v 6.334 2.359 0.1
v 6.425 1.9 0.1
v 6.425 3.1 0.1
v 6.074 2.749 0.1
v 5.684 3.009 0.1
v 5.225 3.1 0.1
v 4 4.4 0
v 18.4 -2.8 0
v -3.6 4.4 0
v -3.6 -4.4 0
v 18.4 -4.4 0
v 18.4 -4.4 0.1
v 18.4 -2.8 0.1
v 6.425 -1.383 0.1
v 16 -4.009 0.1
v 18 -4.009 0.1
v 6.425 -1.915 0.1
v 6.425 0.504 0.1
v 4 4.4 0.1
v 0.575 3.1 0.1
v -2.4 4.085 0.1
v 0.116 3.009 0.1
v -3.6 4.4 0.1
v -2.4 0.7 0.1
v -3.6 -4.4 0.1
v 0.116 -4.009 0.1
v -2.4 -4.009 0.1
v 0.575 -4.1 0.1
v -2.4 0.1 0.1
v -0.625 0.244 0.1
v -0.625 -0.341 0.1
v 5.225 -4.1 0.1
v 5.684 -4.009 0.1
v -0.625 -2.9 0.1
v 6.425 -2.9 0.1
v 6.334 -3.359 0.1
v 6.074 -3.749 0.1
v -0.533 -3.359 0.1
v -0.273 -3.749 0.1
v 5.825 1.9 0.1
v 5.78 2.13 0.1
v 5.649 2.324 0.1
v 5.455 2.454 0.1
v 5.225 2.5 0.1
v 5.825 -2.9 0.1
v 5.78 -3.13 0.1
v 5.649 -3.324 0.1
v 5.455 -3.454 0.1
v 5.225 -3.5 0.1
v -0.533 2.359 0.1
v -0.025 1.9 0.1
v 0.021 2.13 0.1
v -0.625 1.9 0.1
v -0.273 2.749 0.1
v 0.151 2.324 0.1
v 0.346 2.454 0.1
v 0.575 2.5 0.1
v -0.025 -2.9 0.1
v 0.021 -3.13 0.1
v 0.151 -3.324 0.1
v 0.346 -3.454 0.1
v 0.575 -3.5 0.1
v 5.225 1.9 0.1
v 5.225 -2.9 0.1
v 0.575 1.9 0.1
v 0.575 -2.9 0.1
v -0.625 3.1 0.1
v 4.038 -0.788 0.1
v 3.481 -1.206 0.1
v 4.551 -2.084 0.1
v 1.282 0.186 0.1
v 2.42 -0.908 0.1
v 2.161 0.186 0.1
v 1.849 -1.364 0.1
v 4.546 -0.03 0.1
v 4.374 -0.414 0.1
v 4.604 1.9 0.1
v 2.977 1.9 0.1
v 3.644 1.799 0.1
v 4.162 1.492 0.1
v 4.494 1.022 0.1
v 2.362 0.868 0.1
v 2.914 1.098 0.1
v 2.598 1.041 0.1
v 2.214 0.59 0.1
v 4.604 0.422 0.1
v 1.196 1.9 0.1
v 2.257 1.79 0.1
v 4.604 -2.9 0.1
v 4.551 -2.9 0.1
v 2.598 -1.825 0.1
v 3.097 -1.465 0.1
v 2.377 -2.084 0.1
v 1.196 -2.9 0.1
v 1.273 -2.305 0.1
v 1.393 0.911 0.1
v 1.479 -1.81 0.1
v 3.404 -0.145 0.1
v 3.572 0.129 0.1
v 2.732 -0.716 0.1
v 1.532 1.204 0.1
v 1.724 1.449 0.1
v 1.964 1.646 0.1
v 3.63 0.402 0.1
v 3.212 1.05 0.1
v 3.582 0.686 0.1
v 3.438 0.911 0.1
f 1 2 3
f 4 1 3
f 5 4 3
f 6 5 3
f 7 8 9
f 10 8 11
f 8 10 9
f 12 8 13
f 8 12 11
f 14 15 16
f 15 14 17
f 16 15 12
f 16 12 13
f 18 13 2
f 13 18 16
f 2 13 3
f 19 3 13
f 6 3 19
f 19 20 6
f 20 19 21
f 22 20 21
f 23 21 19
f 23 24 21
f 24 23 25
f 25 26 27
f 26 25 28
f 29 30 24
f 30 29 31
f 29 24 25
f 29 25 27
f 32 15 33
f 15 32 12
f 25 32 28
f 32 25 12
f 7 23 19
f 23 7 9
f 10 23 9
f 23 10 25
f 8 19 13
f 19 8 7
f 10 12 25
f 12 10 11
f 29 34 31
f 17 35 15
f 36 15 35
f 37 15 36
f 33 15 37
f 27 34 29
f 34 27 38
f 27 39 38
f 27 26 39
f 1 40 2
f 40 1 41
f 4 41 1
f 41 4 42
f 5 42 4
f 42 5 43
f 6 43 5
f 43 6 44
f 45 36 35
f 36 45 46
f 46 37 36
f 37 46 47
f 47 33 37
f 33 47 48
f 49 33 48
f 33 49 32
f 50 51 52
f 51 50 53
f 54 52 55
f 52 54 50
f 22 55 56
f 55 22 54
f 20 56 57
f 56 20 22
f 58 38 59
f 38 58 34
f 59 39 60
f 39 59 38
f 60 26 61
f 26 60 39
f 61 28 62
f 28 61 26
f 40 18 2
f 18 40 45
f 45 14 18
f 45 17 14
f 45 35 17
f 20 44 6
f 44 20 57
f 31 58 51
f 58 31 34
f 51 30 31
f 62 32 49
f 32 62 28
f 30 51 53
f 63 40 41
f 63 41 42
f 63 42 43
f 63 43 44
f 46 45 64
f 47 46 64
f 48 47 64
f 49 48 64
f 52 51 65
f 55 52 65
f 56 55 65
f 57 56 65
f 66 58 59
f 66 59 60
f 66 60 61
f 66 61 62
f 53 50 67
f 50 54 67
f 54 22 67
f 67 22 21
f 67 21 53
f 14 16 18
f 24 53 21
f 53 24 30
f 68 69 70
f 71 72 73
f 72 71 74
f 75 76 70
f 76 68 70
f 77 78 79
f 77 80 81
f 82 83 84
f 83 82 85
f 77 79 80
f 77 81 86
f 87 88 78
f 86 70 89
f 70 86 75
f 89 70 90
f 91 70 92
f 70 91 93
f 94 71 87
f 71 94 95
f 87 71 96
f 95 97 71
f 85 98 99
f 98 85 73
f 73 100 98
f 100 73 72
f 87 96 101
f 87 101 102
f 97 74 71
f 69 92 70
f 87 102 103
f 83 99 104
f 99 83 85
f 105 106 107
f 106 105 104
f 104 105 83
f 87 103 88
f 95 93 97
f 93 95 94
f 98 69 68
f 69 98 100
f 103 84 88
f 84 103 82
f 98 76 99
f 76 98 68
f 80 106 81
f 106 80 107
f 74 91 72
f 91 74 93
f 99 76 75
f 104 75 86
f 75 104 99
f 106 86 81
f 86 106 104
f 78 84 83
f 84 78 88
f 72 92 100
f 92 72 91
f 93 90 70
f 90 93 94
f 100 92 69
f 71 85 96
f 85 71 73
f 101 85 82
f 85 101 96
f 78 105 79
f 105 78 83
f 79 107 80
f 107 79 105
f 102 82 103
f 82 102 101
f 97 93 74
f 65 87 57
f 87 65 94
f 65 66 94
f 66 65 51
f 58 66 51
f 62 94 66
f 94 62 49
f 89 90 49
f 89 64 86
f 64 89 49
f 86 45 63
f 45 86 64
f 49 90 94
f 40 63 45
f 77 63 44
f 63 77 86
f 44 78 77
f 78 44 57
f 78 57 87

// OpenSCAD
// file: ../p/1-4ndis.scad
use <../lib.scad>
function ldraw_lib__1_4ndis() = [
// 0 Disc Negative 0.25
// 0 Name: 1-4ndis.dat
// 0 Author: James Jessiman
// 0 !LDRAW_ORG Primitive UPDATE 2012-01
// 0 !LICENSE Licensed under CC BY 4.0 : see CAreadme.txt
// 
// 0 BFC CERTIFY CCW
  [0,"BFC","CERTIFY"],
  [0,"BFC","CCW"],
// 
// 0 !HISTORY 2002-03-23 [sbliss] Added BFC Statement
// 0 !HISTORY 2002-04-25 [PTadmin] Official Update 2002-02
// 0 !HISTORY 2007-06-22 [PTadmin] Header formatted for Contributor Agreement
// 0 !HISTORY 2008-07-01 [PTadmin] Official Update 2008-01
// 0 !HISTORY 2012-02-16 [Philo] Changed to CCW
// 0 !HISTORY 2012-03-30 [PTadmin] Official Update 2012-01
// 
// 
// 3 16 0.9239 0 0.3827 1 0 0 1 0 1
  [3,16,0.9239,0,0.3827,1,0,0,1,0,1],
// 3 16 0.7071 0 0.7071 0.9239 0 0.3827 1 0 1
  [3,16,0.7071,0,0.7071,0.9239,0,0.3827,1,0,1],
// 3 16 0.3827 0 0.9239 0.7071 0 0.7071 1 0 1
  [3,16,0.3827,0,0.9239,0.7071,0,0.7071,1,0,1],
// 3 16 0 0 1 0.3827 0 0.9239 1 0 1
  [3,16,0,0,1,0.3827,0,0.9239,1,0,1],
];
module ldraw_lib__1_4ndis(step=0, col=false, unit=2/5, alt=false, line=0.2, solid=!$preview)
    makepoly(ldraw_lib__1_4ndis(), step=step, col=col, unit=unit, alt=alt, line=line, solid=solid);
ldraw_lib__1_4ndis(line=0.2);
// file: ../p/3-16ndis.scad
use <../lib.scad>
function ldraw_lib__3_16ndis() = [
// 0 Disc Negative 0.1875
// 0 Name: 3-16ndis.dat
// 0 Author: Guy Vivan [guyvivan]
// 0 !LDRAW_ORG Primitive UPDATE 2009-01
// 0 !LICENSE Licensed under CC BY 2.0 and CC BY 4.0 : see CAreadme.txt
// 
// 0 BFC CERTIFY CCW
  [0,"BFC","CERTIFY"],
  [0,"BFC","CCW"],
// 
// 0 !HISTORY 2009-05-02 [PTadmin] Official Update 2009-01
// 
// 
// 3 16 1 0 1 0.9239 0 0.3827 1 0 0
  [3,16,1,0,1,0.9239,0,0.3827,1,0,0],
// 3 16 1 0 1 0.7071 0 0.7071 0.9239 0 0.3827
  [3,16,1,0,1,0.7071,0,0.7071,0.9239,0,0.3827],
// 3 16 1 0 1 0.3827 0 0.9239 0.7071 0 0.7071
  [3,16,1,0,1,0.3827,0,0.9239,0.7071,0,0.7071],
// 
// 0 end of file
// 
];
module ldraw_lib__3_16ndis(step=0, col=false, unit=2/5, alt=false, line=0.2, solid=!$preview)
    makepoly(ldraw_lib__3_16ndis(), step=step, col=col, unit=unit, alt=alt, line=line, solid=solid);
ldraw_lib__3_16ndis(line=0.2);
// file: ../p/1-4ring1.scad
use <../lib.scad>
function ldraw_lib__1_4ring1() = [
// 0 Ring  1 x 0.25
// 0 Name: 1-4ring1.dat
// 0 Author: Chris Dee [cwdee]
// 0 !LDRAW_ORG Primitive UPDATE 2012-01
// 0 !LICENSE Licensed under CC BY 2.0 and CC BY 4.0 : see CAreadme.txt
// 
// 0 BFC CERTIFY CCW
  [0,"BFC","CERTIFY"],
  [0,"BFC","CCW"],
// 
// 0 !HISTORY 2000-05-07 [PTadmin] Official Update 2000-01
// 0 !HISTORY 2002-11-22 [hafhead] Added BFC statement
// 0 !HISTORY 2002-11-30 [PTadmin] Official Update 2002-05
// 0 !HISTORY 2007-06-22 [PTadmin] Header formatted for Contributor Agreement
// 0 !HISTORY 2008-07-01 [PTadmin] Official Update 2008-01
// 0 !HISTORY 2012-02-16 [Philo] Changed to CCW
// 0 !HISTORY 2012-03-30 [PTadmin] Official Update 2012-01
// 
// 
// 4 16 2 0 0 1.8478 0 0.7654 0.9239 0 0.3827 1 0 0
  [4,16,2,0,0,1.8478,0,0.7654,0.9239,0,0.3827,1,0,0],
// 4 16 1.8478 0 0.7654 1.4142 0 1.4142 0.7071 0 0.7071 0.9239 0 0.3827
  [4,16,1.8478,0,0.7654,1.4142,0,1.4142,0.7071,0,0.7071,0.9239,0,0.3827],
// 4 16 1.4142 0 1.4142 0.7654 0 1.8478 0.3827 0 0.9239 0.7071 0 0.7071
  [4,16,1.4142,0,1.4142,0.7654,0,1.8478,0.3827,0,0.9239,0.7071,0,0.7071],
// 4 16 0.7654 0 1.8478 0 0 2 0 0 1 0.3827 0 0.9239
  [4,16,0.7654,0,1.8478,0,0,2,0,0,1,0.3827,0,0.9239],
];
module ldraw_lib__1_4ring1(step=0, col=false, unit=2/5, alt=false, line=0.2, solid=!$preview)
    makepoly(ldraw_lib__1_4ring1(), step=step, col=col, unit=unit, alt=alt, line=line, solid=solid);
ldraw_lib__1_4ring1(line=0.2);
// file: ../p/1-4disc.scad
use <../lib.scad>
function ldraw_lib__1_4disc() = [
// 0 Disc 0.25
// 0 Name: 1-4disc.dat
// 0 Author: James Jessiman
// 0 !LDRAW_ORG Primitive UPDATE 2002-02
// 0 !LICENSE Licensed under CC BY 4.0 : see CAreadme.txt
// 
// 0 BFC CERTIFY CCW
  [0,"BFC","CERTIFY"],
  [0,"BFC","CCW"],
// 
// 0 !HISTORY 2002-03-23 [sbliss] Added BFC statement.
// 0 !HISTORY 2002-04-25 [PTadmin] Official Update 2002-02
// 0 !HISTORY 2007-06-22 [PTadmin] Header formatted for Contributor Agreement
// 0 !HISTORY 2008-07-01 [PTadmin] Official Update 2008-01
// 
// 
// 3 16 0 0 0 1 0 0 0.9239 0 0.3827
  [3,16,0,0,0,1,0,0,0.9239,0,0.3827],
// 3 16 0 0 0 0.9239 0 0.3827 0.7071 0 0.7071
  [3,16,0,0,0,0.9239,0,0.3827,0.7071,0,0.7071],
// 3 16 0 0 0 0.7071 0 0.7071 0.3827 0 0.9239
  [3,16,0,0,0,0.7071,0,0.7071,0.3827,0,0.9239],
// 3 16 0 0 0 0.3827 0 0.9239 0 0 1
  [3,16,0,0,0,0.3827,0,0.9239,0,0,1],
// 0
];
module ldraw_lib__1_4disc(step=0, col=false, unit=2/5, alt=false, line=0.2, solid=!$preview)
    makepoly(ldraw_lib__1_4disc(), step=step, col=col, unit=unit, alt=alt, line=line, solid=solid);
ldraw_lib__1_4disc(line=0.2);
// file: ../p/type-swiss721bt-bold-n2.scad
use <../lib.scad>
function ldraw_lib__type_swiss721bt_bold_n2() = [
// 0 Type Swiss721BT Number "2" Bold
// 0 Name: type-swiss721bt-bold-n2.dat
// 0 Author: Ulrich Röder [UR]
// 0 !LDRAW_ORG Primitive UPDATE 2019-01
// 0 !LICENSE Licensed under CC BY 4.0 : see CAreadme.txt
// 
// 0 BFC CERTIFY CCW
  [0,"BFC","CERTIFY"],
  [0,"BFC","CCW"],
// 
// 0 !HISTORY 2019-06-28 [PTadmin] Official Update 2019-01
// 
// 
// 0 // Main
// 3 16 .237 0 -.06 .121 0 -.147 .344 0 -.33
  [3,16,.237,0,-.06,.121,0,-.147,.344,0,-.33],
// 4 16 -.154 0 .143 -.337 0 .143 -.219 0 -.18 -.1 0 -.085
  [4,16,-.154,0,.143,-.337,0,.143,-.219,0,-.18,-.1,0,-.085],
// 3 16 .343 0 .098 .307 0 .018 .344 0 -.33
  [3,16,.343,0,.098,.307,0,.018,.344,0,-.33],
// 3 16 .307 0 .018 .237 0 -.06 .344 0 -.33
  [3,16,.307,0,.018,.237,0,-.06,.344,0,-.33],
// 3 16 .355 0 .5 .016 0 .5 .155 0 .479
  [3,16,.355,0,.5,.016,0,.5,.155,0,.479],
// 3 16 .355 0 .5 .263 0 .415 .332 0 .317
  [3,16,.355,0,.5,.263,0,.415,.332,0,.317],
// 4 16 -.112 0 .285 -.143 0 .227 .003 0 .333 -.063 0 .321
  [4,16,-.112,0,.285,-.143,0,.227,.003,0,.333,-.063,0,.321],
// 3 16 .355 0 .5 .155 0 .479 .263 0 .415
  [3,16,.355,0,.5,.155,0,.479,.263,0,.415],
// 3 16 .355 0 .5 .332 0 .317 .355 0 .192
  [3,16,.355,0,.5,.332,0,.317,.355,0,.192],
// 3 16 -.355 0 .5 -.134 0 .477 .016 0 .5
  [3,16,-.355,0,.5,-.134,0,.477,.016,0,.5],
// 4 16 .355 0 -.5 .355 0 .192 .343 0 .098 .344 0 -.33
  [4,16,.355,0,-.5,.355,0,.192,.343,0,.098,.344,0,-.33],
// 3 16 .355 0 -.5 .344 0 -.33 .344 0 -.5
  [3,16,.355,0,-.5,.344,0,-.33,.344,0,-.5],
// 4 16 -.109 0 -.33 .344 0 -.33 .041 0 -.201 -.063 0 -.276
  [4,16,-.109,0,-.33,.344,0,-.33,.041,0,-.201,-.063,0,-.276],
// 4 16 -.339 0 -.376 -.337 0 .143 -.355 0 .5 -.355 0 -.5
  [4,16,-.339,0,-.376,-.337,0,.143,-.355,0,.5,-.355,0,-.5],
// 3 16 -.355 0 .5 -.337 0 .143 -.314 0 .294
  [3,16,-.355,0,.5,-.337,0,.143,-.314,0,.294],
// 3 16 -.339 0 -.376 -.296 0 -.273 -.337 0 .143
  [3,16,-.339,0,-.376,-.296,0,-.273,-.337,0,.143],
// 4 16 .14 0 .131 -.143 0 .227 -.154 0 .143 .105 0 .074
  [4,16,.14,0,.131,-.143,0,.227,-.154,0,.143,.105,0,.074],
// 4 16 -.1 0 -.085 -.035 0 -.045 .105 0 .074 -.154 0 .143
  [4,16,-.1,0,-.085,-.035,0,-.045,.105,0,.074,-.154,0,.143],
// 3 16 -.355 0 .5 -.314 0 .294 -.285 0 .355
  [3,16,-.355,0,.5,-.314,0,.294,-.285,0,.355],
// 3 16 -.355 0 .5 -.285 0 .355 -.245 0 .406
  [3,16,-.355,0,.5,-.285,0,.355,-.245,0,.406],
// 3 16 -.296 0 -.273 -.219 0 -.18 -.337 0 .143
  [3,16,-.296,0,-.273,-.219,0,-.18,-.337,0,.143],
// 3 16 .121 0 -.147 .041 0 -.201 .344 0 -.33
  [3,16,.121,0,-.147,.041,0,-.201,.344,0,-.33],
// 3 16 -.355 0 .5 -.245 0 .406 -.195 0 .447
  [3,16,-.355,0,.5,-.245,0,.406,-.195,0,.447],
// 4 16 .152 0 .188 .003 0 .333 -.143 0 .227 .14 0 .131
  [4,16,.152,0,.188,.003,0,.333,-.143,0,.227,.14,0,.131],
// 4 16 .112 0 .294 .065 0 .323 .152 0 .188 .142 0 .247
  [4,16,.112,0,.294,.065,0,.323,.152,0,.188,.142,0,.247],
// 3 16 .152 0 .188 .065 0 .323 .003 0 .333
  [3,16,.152,0,.188,.065,0,.323,.003,0,.333],
// 3 16 -.355 0 .5 -.195 0 .447 -.134 0 .477
  [3,16,-.355,0,.5,-.195,0,.447,-.134,0,.477],
// 
// 0 // Black
// 4 0 -.296 0 -.273 -.339 0 -.376 -.355 0 -.5 -.109 0 -.33
  [4,0,-.296,0,-.273,-.339,0,-.376,-.355,0,-.5,-.109,0,-.33],
// 4 0 -.035 0 -.045 .121 0 -.147 .237 0 -.06 .105 0 .074
  [4,0,-.035,0,-.045,.121,0,-.147,.237,0,-.06,.105,0,.074],
// 4 0 -.134 0 .477 -.195 0 .447 -.112 0 .285 -.063 0 .321
  [4,0,-.134,0,.477,-.195,0,.447,-.112,0,.285,-.063,0,.321],
// 4 0 .237 0 -.06 .307 0 .018 .14 0 .131 .105 0 .074
  [4,0,.237,0,-.06,.307,0,.018,.14,0,.131,.105,0,.074],
// 4 0 .112 0 .294 .142 0 .247 .332 0 .317 .263 0 .415
  [4,0,.112,0,.294,.142,0,.247,.332,0,.317,.263,0,.415],
// 4 0 -.1 0 -.085 -.219 0 -.18 -.109 0 -.33 -.063 0 -.276
  [4,0,-.1,0,-.085,-.219,0,-.18,-.109,0,-.33,-.063,0,-.276],
// 3 0 .14 0 .131 .307 0 .018 .343 0 .098
  [3,0,.14,0,.131,.307,0,.018,.343,0,.098],
// 4 0 .14 0 .131 .343 0 .098 .355 0 .192 .152 0 .188
  [4,0,.14,0,.131,.343,0,.098,.355,0,.192,.152,0,.188],
// 4 0 .152 0 .188 .355 0 .192 .332 0 .317 .142 0 .247
  [4,0,.152,0,.188,.355,0,.192,.332,0,.317,.142,0,.247],
// 4 0 .003 0 .333 .016 0 .5 -.134 0 .477 -.063 0 .321
  [4,0,.003,0,.333,.016,0,.5,-.134,0,.477,-.063,0,.321],
// 4 0 -.035 0 -.045 -.1 0 -.085 -.063 0 -.276 .041 0 -.201
  [4,0,-.035,0,-.045,-.1,0,-.085,-.063,0,-.276,.041,0,-.201],
// 4 0 -.109 0 -.33 -.355 0 -.5 .344 0 -.5 .344 0 -.33
  [4,0,-.109,0,-.33,-.355,0,-.5,.344,0,-.5,.344,0,-.33],
// 3 0 -.035 0 -.045 .041 0 -.201 .121 0 -.147
  [3,0,-.035,0,-.045,.041,0,-.201,.121,0,-.147],
// 4 0 -.314 0 .294 -.337 0 .143 -.154 0 .143 -.143 0 .227
  [4,0,-.314,0,.294,-.337,0,.143,-.154,0,.143,-.143,0,.227],
// 4 0 -.112 0 .285 -.285 0 .355 -.314 0 .294 -.143 0 .227
  [4,0,-.112,0,.285,-.285,0,.355,-.314,0,.294,-.143,0,.227],
// 4 0 .003 0 .333 .065 0 .323 .155 0 .479 .016 0 .5
  [4,0,.003,0,.333,.065,0,.323,.155,0,.479,.016,0,.5],
// 4 0 .263 0 .415 .155 0 .479 .065 0 .323 .112 0 .294
  [4,0,.263,0,.415,.155,0,.479,.065,0,.323,.112,0,.294],
// 4 0 -.285 0 .355 -.112 0 .285 -.195 0 .447 -.245 0 .406
  [4,0,-.285,0,.355,-.112,0,.285,-.195,0,.447,-.245,0,.406],
// 3 0 -.296 0 -.273 -.109 0 -.33 -.219 0 -.18
  [3,0,-.296,0,-.273,-.109,0,-.33,-.219,0,-.18],
];
module ldraw_lib__type_swiss721bt_bold_n2(step=0, col=false, unit=2/5, alt=false, line=0.2, solid=!$preview)
    makepoly(ldraw_lib__type_swiss721bt_bold_n2(), step=step, col=col, unit=unit, alt=alt, line=line, solid=solid);
ldraw_lib__type_swiss721bt_bold_n2(line=0.2);
// file: s/821435as03.scad
use <../../lib.scad>
use <../../p/1-4ndis.scad>
function ldraw_lib__s__821435as03() = [
// 0 ~Sticker Sloped Body for Racing Number
// 0 Name: s\821435as03.dat
// 0 Author: Ulrich Röder [UR]
// 0 !LDRAW_ORG Subpart UPDATE 2019-01
// 0 !LICENSE Licensed under CC BY 4.0 : see CAreadme.txt
// 
// 0 BFC CERTIFY CCW
  [0,"BFC","CERTIFY"],
  [0,"BFC","CCW"],
// 
// 0 !HISTORY 2019-06-28 [PTadmin] Official Update 2019-01
// 
// 
// 0 // Main
// 1 16 13.063 -.25 4.75 3 0 0 0 1 0 0 0 3 1-4ndis.dat
  [1,16,13.063,-.25,4.75,3,0,0,0,1,0,0,0,3, ldraw_lib__1_4ndis()],
// 3 16 10 0 11 46 0 -7 -9 0 11
  [3,16,10,0,11,46,0,-7,-9,0,11],
// 4 16 -9 0 -11 -9 0 11 46 0 -7 46 0 -11
  [4,16,-9,0,-11,-9,0,11,46,0,-7,46,0,-11],
// 4 16 46 -.25 -11 46 0 -11 46 0 -7 46 -.25 -7
  [4,16,46,-.25,-11,46,0,-11,46,0,-7,46,-.25,-7],
// 4 16 16.063 -.25 -4.788 40 -.25 -10.022 45 -.25 -10.022 16.063 -.25 -3.458
  [4,16,16.063,-.25,-4.788,40,-.25,-10.022,45,-.25,-10.022,16.063,-.25,-3.458],
// 3 16 45 -.25 -10.022 40 -.25 -10.022 46 -.25 -11
  [3,16,45,-.25,-10.022,40,-.25,-10.022,46,-.25,-11],
// 3 16 45 -.25 -10.022 46 -.25 -11 46 -.25 -7
  [3,16,45,-.25,-10.022,46,-.25,-11,46,-.25,-7],
// 4 16 16.063 -.25 4.75 16.063 -.25 1.261 45 -.25 -10.022 46 -.25 -7
  [4,16,16.063,-.25,4.75,16.063,-.25,1.261,45,-.25,-10.022,46,-.25,-7],
// 3 16 16.063 -.25 4.75 46 -.25 -7 16.063 -.25 7.75
  [3,16,16.063,-.25,4.75,46,-.25,-7,16.063,-.25,7.75],
// 3 16 10 -.25 11 16.063 -.25 7.75 46 -.25 -7
  [3,16,10,-.25,11,16.063,-.25,7.75,46,-.25,-7],
// 3 16 13.063 -.25 7.75 16.063 -.25 7.75 10 -.25 11
  [3,16,13.063,-.25,7.75,16.063,-.25,7.75,10,-.25,11],
// 4 16 -6 -.25 10.213 1.438 -.25 7.75 13.063 -.25 7.75 10 -.25 11
  [4,16,-6,-.25,10.213,1.438,-.25,7.75,13.063,-.25,7.75,10,-.25,11],
// 3 16 .2899 -.25 7.5217 1.438 -.25 7.75 -6 -.25 10.213
  [3,16,.2899,-.25,7.5217,1.438,-.25,7.75,-6,-.25,10.213],
// 3 16 -9 -.25 11 -6 -.25 10.213 10 -.25 11
  [3,16,-9,-.25,11,-6,-.25,10.213,10,-.25,11],
// 4 16 -9 -.25 -11 -6 -.25 1.75 -6 -.25 10.213 -9 -.25 11
  [4,16,-9,-.25,-11,-6,-.25,1.75,-6,-.25,10.213,-9,-.25,11],
// 4 16 1.438 -.25 -10.25 .2899 -.25 -10.0217 -6 -.25 -10.022 -9 -.25 -11
  [4,16,1.438,-.25,-10.25,.2899,-.25,-10.0217,-6,-.25,-10.022,-9,-.25,-11],
// 4 16 -1.563 -.25 .61 -6 -.25 1.75 -6 -.25 .25 -1.563 -.25 -.853
  [4,16,-1.563,-.25,.61,-6,-.25,1.75,-6,-.25,.25,-1.563,-.25,-.853],
// 3 16 -6 -.25 .25 -6 -.25 1.75 -9 -.25 -11
  [3,16,-6,-.25,.25,-6,-.25,1.75,-9,-.25,-11],
// 3 16 -6 -.25 .25 -9 -.25 -11 -6 -.25 -10.022
  [3,16,-6,-.25,.25,-9,-.25,-11,-6,-.25,-10.022],
// 4 16 40 -.25 -10.022 14.2111 -.25 -10.0217 13.063 -.25 -10.25 46 -.25 -11
  [4,16,40,-.25,-10.022,14.2111,-.25,-10.0217,13.063,-.25,-10.25,46,-.25,-11],
// 4 16 1.438 -.25 -10.25 -9 -.25 -11 46 -.25 -11 13.063 -.25 -10.25
  [4,16,1.438,-.25,-10.25,-9,-.25,-11,46,-.25,-11,13.063,-.25,-10.25],
// 4 16 -9 -.25 11 10 -.25 11 10 0 11 -9 0 11
  [4,16,-9,-.25,11,10,-.25,11,10,0,11,-9,0,11],
// 4 16 -9 0 11 -9 0 -11 -9 -.25 -11 -9 -.25 11
  [4,16,-9,0,11,-9,0,-11,-9,-.25,-11,-9,-.25,11],
// 4 16 10 -.25 11 46 -.25 -7 46 0 -7 10 0 11
  [4,16,10,-.25,11,46,-.25,-7,46,0,-7,10,0,11],
// 4 16 46 0 -11 46 -.25 -11 -9 -.25 -11 -9 0 -11
  [4,16,46,0,-11,46,-.25,-11,-9,-.25,-11,-9,0,-11],
];
module ldraw_lib__s__821435as03(step=0, col=false, unit=2/5, alt=false, line=0.2, solid=!$preview)
    makepoly(ldraw_lib__s__821435as03(), step=step, col=col, unit=unit, alt=alt, line=line, solid=solid);
ldraw_lib__s__821435as03(line=0.2);
// file: s/821435as02.scad
use <../../lib.scad>
use <../../p/3-16ndis.scad>
function ldraw_lib__s__821435as02() = [
// 0 ~Sticker Upper Triangle with Cutout for Racing Number
// 0 Name: s\821435as02.dat
// 0 Author: Ulrich Röder [UR]
// 0 !LDRAW_ORG Subpart UPDATE 2019-01
// 0 !LICENSE Licensed under CC BY 4.0 : see CAreadme.txt
// 
// 0 BFC CERTIFY CCW
  [0,"BFC","CERTIFY"],
  [0,"BFC","CCW"],
// 
// 0 !HISTORY 2019-06-28 [PTadmin] Official Update 2019-01
// 
// 
// 0 // Main
// 1 16 1.438 -.25 4.75 -3 0 0 0 1 0 0 0 3 3-16ndis.dat
  [1,16,1.438,-.25,4.75,-3,0,0,0,1,0,0,0,3, ldraw_lib__3_16ndis()],
// 3 16 -1.562 -.25 7.75 .2899 -.25 7.5217 -6 -.25 10.213
  [3,16,-1.562,-.25,7.75,.2899,-.25,7.5217,-6,-.25,10.213],
// 3 16 -1.562 -.25 7.75 -6 -.25 10.213 -1.562 -.25 4.75
  [3,16,-1.562,-.25,7.75,-6,-.25,10.213,-1.562,-.25,4.75],
// 3 16 16.063 -.25 -3.458 45 -.25 -10.022 16.063 -.25 1.261
  [3,16,16.063,-.25,-3.458,45,-.25,-10.022,16.063,-.25,1.261],
// 4 16 -6 -.25 1.75 -1.563 -.25 .61 -1.562 -.25 4.75 -6 -.25 10.213
  [4,16,-6,-.25,1.75,-1.563,-.25,.61,-1.562,-.25,4.75,-6,-.25,10.213],
];
module ldraw_lib__s__821435as02(step=0, col=false, unit=2/5, alt=false, line=0.2, solid=!$preview)
    makepoly(ldraw_lib__s__821435as02(), step=step, col=col, unit=unit, alt=alt, line=line, solid=solid);
ldraw_lib__s__821435as02(line=0.2);
// file: s/821435as01.scad
use <../../lib.scad>
use <../../p/1-4disc.scad>
use <../../p/1-4ring1.scad>
function ldraw_lib__s__821435as01() = [
// 0 ~Sticker Lower Triangle and Racing Number Frame
// 0 Name: s\821435as01.dat
// 0 Author: Ulrich Röder [UR]
// 0 !LDRAW_ORG Subpart UPDATE 2019-01
// 0 !LICENSE Licensed under CC BY 4.0 : see CAreadme.txt
// 
// 0 BFC CERTIFY CCW
  [0,"BFC","CERTIFY"],
  [0,"BFC","CCW"],
// 
// 0 !HISTORY 2019-06-28 [PTadmin] Official Update 2019-01
// 
// 
// 0 // Main
// 
// 3 16 -6 -0.25 0.25 -1.562 -0.25 -7.25 -1.563 -0.25 -0.853
  [3,16,-6,-0.25,0.25,-1.562,-0.25,-7.25,-1.563,-0.25,-0.853],
// 3 16 16.063 -0.25 -4.788 16.063 -0.25 -7.25 40 -0.25 -10.022
  [3,16,16.063,-0.25,-4.788,16.063,-0.25,-7.25,40,-0.25,-10.022],
// 3 16 15.8347 -0.25 -8.3981 40 -0.25 -10.022 16.063 -0.25 -7.25
  [3,16,15.8347,-0.25,-8.3981,40,-0.25,-10.022,16.063,-0.25,-7.25],
// 3 16 15.1843 -0.25 -9.3713 40 -0.25 -10.022 15.8347 -0.25 -8.3981
  [3,16,15.1843,-0.25,-9.3713,40,-0.25,-10.022,15.8347,-0.25,-8.3981],
// 3 16 14.2111 -0.25 -10.0217 40 -0.25 -10.022 15.1843 -0.25 -9.3713
  [3,16,14.2111,-0.25,-10.0217,40,-0.25,-10.022,15.1843,-0.25,-9.3713],
// 4 16 -6 -0.25 0.25 -6 -0.25 -10.022 -1.3337 -0.25 -8.3981 -1.562 -0.25 -7.25
  [4,16,-6,-0.25,0.25,-6,-0.25,-10.022,-1.3337,-0.25,-8.3981,-1.562,-0.25,-7.25],
// 3 16 -6 -0.25 -10.022 -0.6833 -0.25 -9.3713 -1.3337 -0.25 -8.3981
  [3,16,-6,-0.25,-10.022,-0.6833,-0.25,-9.3713,-1.3337,-0.25,-8.3981],
// 3 16 -6 -0.25 -10.022 0.2899 -0.25 -10.0217 -0.6833 -0.25 -9.3713
  [3,16,-6,-0.25,-10.022,0.2899,-0.25,-10.0217,-0.6833,-0.25,-9.3713],
// 
// 0 // Black
// 1 0 13.063 -.25 4.75 1.5 0 0 0 1 0 0 0 1.5 1-4ring1.dat
  [1,0,13.063,-.25,4.75,1.5,0,0,0,1,0,0,0,1.5, ldraw_lib__1_4ring1()],
// 1 0 13.063 -.25 -7.25 1.5 0 0 0 1 0 0 0 -1.5 1-4ring1.dat
  [1,0,13.063,-.25,-7.25,1.5,0,0,0,1,0,0,0,-1.5, ldraw_lib__1_4ring1()],
// 1 0 1.438 -.25 4.75 -1.5 0 0 0 1 0 0 0 1.5 1-4ring1.dat
  [1,0,1.438,-.25,4.75,-1.5,0,0,0,1,0,0,0,1.5, ldraw_lib__1_4ring1()],
// 1 0 1.438 -.25 -7.25 -1.5 0 0 0 1 0 0 0 -1.5 1-4ring1.dat
  [1,0,1.438,-.25,-7.25,-1.5,0,0,0,1,0,0,0,-1.5, ldraw_lib__1_4ring1()],
// 4 0 14.563 -0.25 4.75 14.563 -0.25 -7.25 16.063 -0.25 1.261 16.063 -0.25 4.75
  [4,0,14.563,-0.25,4.75,14.563,-0.25,-7.25,16.063,-0.25,1.261,16.063,-0.25,4.75],
// 3 0 14.563 -0.25 -7.25 16.063 -0.25 -3.458 16.063 -0.25 1.261
  [3,0,14.563,-0.25,-7.25,16.063,-0.25,-3.458,16.063,-0.25,1.261],
// 3 0 14.563 -0.25 -7.25 16.063 -0.25 -4.788 16.063 -0.25 -3.458
  [3,0,14.563,-0.25,-7.25,16.063,-0.25,-4.788,16.063,-0.25,-3.458],
// 3 0 14.563 -0.25 -7.25 16.063 -0.25 -7.25 16.063 -0.25 -4.788
  [3,0,14.563,-0.25,-7.25,16.063,-0.25,-7.25,16.063,-0.25,-4.788],
// 4 0 13.063 -0.25 6.25 13.063 -0.25 7.75 1.438 -0.25 7.75 1.438 -0.25 6.25
  [4,0,13.063,-0.25,6.25,13.063,-0.25,7.75,1.438,-0.25,7.75,1.438,-0.25,6.25],
// 4 0 -0.062 -0.25 4.75 -1.563 -0.25 -0.853 -1.562 -0.25 -7.25 -0.062 -0.25 -7.25
  [4,0,-0.062,-0.25,4.75,-1.563,-0.25,-0.853,-1.562,-0.25,-7.25,-0.062,-0.25,-7.25],
// 3 0 -0.062 -0.25 4.75 -1.563 -0.25 0.61 -1.563 -0.25 -0.853
  [3,0,-0.062,-0.25,4.75,-1.563,-0.25,0.61,-1.563,-0.25,-0.853],
// 4 0 1.438 -0.25 -10.25 13.063 -0.25 -10.25 13.063 -0.25 -8.75 1.438 -0.25 -8.75
  [4,0,1.438,-0.25,-10.25,13.063,-0.25,-10.25,13.063,-0.25,-8.75,1.438,-0.25,-8.75],
// 3 0 -1.563 -0.25 0.61 -0.062 -0.25 4.75 -1.562 -0.25 4.75
  [3,0,-1.563,-0.25,0.61,-0.062,-0.25,4.75,-1.562,-0.25,4.75],
// 
// 0 // White
// 1 15 13.063 -.25 4.75 1.5 0 0 0 1 0 0 0 1.5 1-4disc.dat
  [1,15,13.063,-.25,4.75,1.5,0,0,0,1,0,0,0,1.5, ldraw_lib__1_4disc()],
// 1 15 13.063 -.25 -7.25 1.5 0 0 0 1 0 0 0 -1.5 1-4disc.dat
  [1,15,13.063,-.25,-7.25,1.5,0,0,0,1,0,0,0,-1.5, ldraw_lib__1_4disc()],
// 1 15 1.438 -.25 4.75 -1.5 0 0 0 1 0 0 0 1.5 1-4disc.dat
  [1,15,1.438,-.25,4.75,-1.5,0,0,0,1,0,0,0,1.5, ldraw_lib__1_4disc()],
// 1 15 1.438 -.25 -7.25 -1.5 0 0 0 1 0 0 0 -1.5 1-4disc.dat
  [1,15,1.438,-.25,-7.25,-1.5,0,0,0,1,0,0,0,-1.5, ldraw_lib__1_4disc()],
];
module ldraw_lib__s__821435as01(step=0, col=false, unit=2/5, alt=false, line=0.2, solid=!$preview)
    makepoly(ldraw_lib__s__821435as01(), step=step, col=col, unit=unit, alt=alt, line=line, solid=solid);
ldraw_lib__s__821435as01(line=0.2);
// main file
use <../lib.scad>
use <s/821435as01.scad>
use <s/821435as02.scad>
use <s/821435as03.scad>
use <../p/type-swiss721bt-bold-n2.scad>
function ldraw_lib__821435c() = [
// 0 Sticker with White/Black Triangles and Racing Number "2", Right
// 0 Name: 821435c.dat
// 0 Author: Ulrich Röder [UR]
// 0 !LDRAW_ORG Part UPDATE 2019-01
// 0 !LICENSE Licensed under CC BY 4.0 : see CAreadme.txt
// 
// 0 BFC CERTIFY CCW
  [0,"BFC","CERTIFY"],
  [0,"BFC","CCW"],
// 
// 0 !KEYWORDS cup, Racers, Set 6539
// 
// 0 !HISTORY 2019-06-28 [PTadmin] Official Update 2019-01
// 
// 
// 0 // Main
// 
// 1 16 0 0 0 1 0 0 0 1 0 0 0 1 s\821435as03.dat
  [1,16,0,0,0,1,0,0,0,1,0,0,0,1, ldraw_lib__s__821435as03()],
// 
// 0 // Black
// 1 0 0 0 0 1 0 0 0 1 0 0 0 1 s\821435as01.dat
  [1,0,0,0,0,1,0,0,0,1,0,0,0,1, ldraw_lib__s__821435as01()],
// 
// 0 // White
// 1 15 0 0 0 1 0 0 0 1 0 0 0 1 s\821435as02.dat
  [1,15,0,0,0,1,0,0,0,1,0,0,0,1, ldraw_lib__s__821435as02()],
// 1 15 7.25 -.25 -1.25 12 0 0 0 1 0 0 0 12 type-swiss721bt-bold-n2.dat
  [1,15,7.25,-.25,-1.25,12,0,0,0,1,0,0,0,12, ldraw_lib__type_swiss721bt_bold_n2()],
// 4 15 2.99 -.25 -7.25 2.99 -.25 4.75 1.438 -.25 6.25 1.438 -.25 4.75
  [4,15,2.99,-.25,-7.25,2.99,-.25,4.75,1.438,-.25,6.25,1.438,-.25,4.75],
// 4 15 1.438 -.25 4.75 -.062 -.25 4.75 1.438 -.25 -7.25 2.99 -.25 -7.25
  [4,15,1.438,-.25,4.75,-.062,-.25,4.75,1.438,-.25,-7.25,2.99,-.25,-7.25],
// 3 15 -.062 -.25 -7.25 1.438 -.25 -7.25 -.062 -.25 4.75
  [3,15,-.062,-.25,-7.25,1.438,-.25,-7.25,-.062,-.25,4.75],
// 4 15 13.063 -.25 -8.75 2.99 -.25 -7.25 1.438 -.25 -7.25 1.438 -.25 -8.75
  [4,15,13.063,-.25,-8.75,2.99,-.25,-7.25,1.438,-.25,-7.25,1.438,-.25,-8.75],
// 3 15 11.51 -.25 -7.25 11.378 -.25 -7.25 13.063 -.25 -8.75
  [3,15,11.51,-.25,-7.25,11.378,-.25,-7.25,13.063,-.25,-8.75],
// 4 15 11.51 -.25 1.054 11.51 -.25 -7.25 13.063 -.25 -8.75 13.063 -.25 -7.25
  [4,15,11.51,-.25,1.054,11.51,-.25,-7.25,13.063,-.25,-8.75,13.063,-.25,-7.25],
// 4 15 13.063 -.25 4.75 11.51 -.25 1.054 13.063 -.25 -7.25 14.563 -.25 -7.25
  [4,15,13.063,-.25,4.75,11.51,-.25,1.054,13.063,-.25,-7.25,14.563,-.25,-7.25],
// 3 15 13.063 -.25 -8.75 11.378 -.25 -7.25 2.99 -.25 -7.25
  [3,15,13.063,-.25,-8.75,11.378,-.25,-7.25,2.99,-.25,-7.25],
// 3 15 14.563 -.25 4.75 13.063 -.25 4.75 14.563 -.25 -7.25
  [3,15,14.563,-.25,4.75,13.063,-.25,4.75,14.563,-.25,-7.25],
// 4 15 13.063 -.25 6.25 11.51 -.25 4.75 11.51 -.25 1.054 13.063 -.25 4.75
  [4,15,13.063,-.25,6.25,11.51,-.25,4.75,11.51,-.25,1.054,13.063,-.25,4.75],
// 4 15 1.438 -.25 6.25 7.442 -.25 4.75 11.51 -.25 4.75 13.063 -.25 6.25
  [4,15,1.438,-.25,6.25,7.442,-.25,4.75,11.51,-.25,4.75,13.063,-.25,6.25],
// 3 15 7.442 -.25 4.75 1.438 -.25 6.25 2.99 -.25 4.75
  [3,15,7.442,-.25,4.75,1.438,-.25,6.25,2.99,-.25,4.75],
];
module ldraw_lib__821435c(step=0, col=false, unit=2/5, alt=false, line=0.2, solid=!$preview)
    makepoly(ldraw_lib__821435c(), step=step, col=col, unit=unit, alt=alt, line=line, solid=solid);
ldraw_lib__821435c(line=0.2);
